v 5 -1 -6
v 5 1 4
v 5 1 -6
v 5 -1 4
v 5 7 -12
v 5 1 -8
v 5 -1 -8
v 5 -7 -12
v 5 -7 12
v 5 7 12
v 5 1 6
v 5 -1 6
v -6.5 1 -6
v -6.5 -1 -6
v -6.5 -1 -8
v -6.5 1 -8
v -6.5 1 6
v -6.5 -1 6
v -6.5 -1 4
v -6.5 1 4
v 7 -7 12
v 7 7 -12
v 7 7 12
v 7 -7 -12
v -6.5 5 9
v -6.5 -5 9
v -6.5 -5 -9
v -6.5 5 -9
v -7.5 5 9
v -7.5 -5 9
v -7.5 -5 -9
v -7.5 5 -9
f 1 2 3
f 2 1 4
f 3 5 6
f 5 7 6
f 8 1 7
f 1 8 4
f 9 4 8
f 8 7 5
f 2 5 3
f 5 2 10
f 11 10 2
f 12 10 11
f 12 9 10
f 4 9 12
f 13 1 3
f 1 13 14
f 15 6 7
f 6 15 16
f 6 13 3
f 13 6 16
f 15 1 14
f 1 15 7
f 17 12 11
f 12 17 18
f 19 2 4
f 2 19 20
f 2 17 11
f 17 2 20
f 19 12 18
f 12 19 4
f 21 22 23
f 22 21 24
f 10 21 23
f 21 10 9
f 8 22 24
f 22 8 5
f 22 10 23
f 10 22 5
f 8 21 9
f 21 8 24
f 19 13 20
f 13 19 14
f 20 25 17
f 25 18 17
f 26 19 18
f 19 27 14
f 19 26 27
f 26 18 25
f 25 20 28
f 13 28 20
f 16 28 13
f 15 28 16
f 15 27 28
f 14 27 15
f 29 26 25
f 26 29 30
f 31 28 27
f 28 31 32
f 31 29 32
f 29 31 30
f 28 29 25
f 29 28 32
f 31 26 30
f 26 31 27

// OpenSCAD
//draw('Top','Rect',P=(6,0,0),G=(2,7,12))


//for(i = [0:1],'Trans',u=(0,0,12))
//draw('Leg','Cub',P=(-7,-1,-8)
//+(i×u),G=(12,2,2))

// Top
translate([6,0,0]) {
    cube([2,14,24], true);
}

// Legs
translate([-7,-1,-8]) {
    cube([12,2,2]);
    translate([0,0,12]) {
        cube([12,2,2]);
    }
}

// "Layer"
translate([-7,0,0]) {
    cube([1,10,18], true);
}
//draw('Layer','Rect',P=(-7,0,0),G=(1,5,9))
